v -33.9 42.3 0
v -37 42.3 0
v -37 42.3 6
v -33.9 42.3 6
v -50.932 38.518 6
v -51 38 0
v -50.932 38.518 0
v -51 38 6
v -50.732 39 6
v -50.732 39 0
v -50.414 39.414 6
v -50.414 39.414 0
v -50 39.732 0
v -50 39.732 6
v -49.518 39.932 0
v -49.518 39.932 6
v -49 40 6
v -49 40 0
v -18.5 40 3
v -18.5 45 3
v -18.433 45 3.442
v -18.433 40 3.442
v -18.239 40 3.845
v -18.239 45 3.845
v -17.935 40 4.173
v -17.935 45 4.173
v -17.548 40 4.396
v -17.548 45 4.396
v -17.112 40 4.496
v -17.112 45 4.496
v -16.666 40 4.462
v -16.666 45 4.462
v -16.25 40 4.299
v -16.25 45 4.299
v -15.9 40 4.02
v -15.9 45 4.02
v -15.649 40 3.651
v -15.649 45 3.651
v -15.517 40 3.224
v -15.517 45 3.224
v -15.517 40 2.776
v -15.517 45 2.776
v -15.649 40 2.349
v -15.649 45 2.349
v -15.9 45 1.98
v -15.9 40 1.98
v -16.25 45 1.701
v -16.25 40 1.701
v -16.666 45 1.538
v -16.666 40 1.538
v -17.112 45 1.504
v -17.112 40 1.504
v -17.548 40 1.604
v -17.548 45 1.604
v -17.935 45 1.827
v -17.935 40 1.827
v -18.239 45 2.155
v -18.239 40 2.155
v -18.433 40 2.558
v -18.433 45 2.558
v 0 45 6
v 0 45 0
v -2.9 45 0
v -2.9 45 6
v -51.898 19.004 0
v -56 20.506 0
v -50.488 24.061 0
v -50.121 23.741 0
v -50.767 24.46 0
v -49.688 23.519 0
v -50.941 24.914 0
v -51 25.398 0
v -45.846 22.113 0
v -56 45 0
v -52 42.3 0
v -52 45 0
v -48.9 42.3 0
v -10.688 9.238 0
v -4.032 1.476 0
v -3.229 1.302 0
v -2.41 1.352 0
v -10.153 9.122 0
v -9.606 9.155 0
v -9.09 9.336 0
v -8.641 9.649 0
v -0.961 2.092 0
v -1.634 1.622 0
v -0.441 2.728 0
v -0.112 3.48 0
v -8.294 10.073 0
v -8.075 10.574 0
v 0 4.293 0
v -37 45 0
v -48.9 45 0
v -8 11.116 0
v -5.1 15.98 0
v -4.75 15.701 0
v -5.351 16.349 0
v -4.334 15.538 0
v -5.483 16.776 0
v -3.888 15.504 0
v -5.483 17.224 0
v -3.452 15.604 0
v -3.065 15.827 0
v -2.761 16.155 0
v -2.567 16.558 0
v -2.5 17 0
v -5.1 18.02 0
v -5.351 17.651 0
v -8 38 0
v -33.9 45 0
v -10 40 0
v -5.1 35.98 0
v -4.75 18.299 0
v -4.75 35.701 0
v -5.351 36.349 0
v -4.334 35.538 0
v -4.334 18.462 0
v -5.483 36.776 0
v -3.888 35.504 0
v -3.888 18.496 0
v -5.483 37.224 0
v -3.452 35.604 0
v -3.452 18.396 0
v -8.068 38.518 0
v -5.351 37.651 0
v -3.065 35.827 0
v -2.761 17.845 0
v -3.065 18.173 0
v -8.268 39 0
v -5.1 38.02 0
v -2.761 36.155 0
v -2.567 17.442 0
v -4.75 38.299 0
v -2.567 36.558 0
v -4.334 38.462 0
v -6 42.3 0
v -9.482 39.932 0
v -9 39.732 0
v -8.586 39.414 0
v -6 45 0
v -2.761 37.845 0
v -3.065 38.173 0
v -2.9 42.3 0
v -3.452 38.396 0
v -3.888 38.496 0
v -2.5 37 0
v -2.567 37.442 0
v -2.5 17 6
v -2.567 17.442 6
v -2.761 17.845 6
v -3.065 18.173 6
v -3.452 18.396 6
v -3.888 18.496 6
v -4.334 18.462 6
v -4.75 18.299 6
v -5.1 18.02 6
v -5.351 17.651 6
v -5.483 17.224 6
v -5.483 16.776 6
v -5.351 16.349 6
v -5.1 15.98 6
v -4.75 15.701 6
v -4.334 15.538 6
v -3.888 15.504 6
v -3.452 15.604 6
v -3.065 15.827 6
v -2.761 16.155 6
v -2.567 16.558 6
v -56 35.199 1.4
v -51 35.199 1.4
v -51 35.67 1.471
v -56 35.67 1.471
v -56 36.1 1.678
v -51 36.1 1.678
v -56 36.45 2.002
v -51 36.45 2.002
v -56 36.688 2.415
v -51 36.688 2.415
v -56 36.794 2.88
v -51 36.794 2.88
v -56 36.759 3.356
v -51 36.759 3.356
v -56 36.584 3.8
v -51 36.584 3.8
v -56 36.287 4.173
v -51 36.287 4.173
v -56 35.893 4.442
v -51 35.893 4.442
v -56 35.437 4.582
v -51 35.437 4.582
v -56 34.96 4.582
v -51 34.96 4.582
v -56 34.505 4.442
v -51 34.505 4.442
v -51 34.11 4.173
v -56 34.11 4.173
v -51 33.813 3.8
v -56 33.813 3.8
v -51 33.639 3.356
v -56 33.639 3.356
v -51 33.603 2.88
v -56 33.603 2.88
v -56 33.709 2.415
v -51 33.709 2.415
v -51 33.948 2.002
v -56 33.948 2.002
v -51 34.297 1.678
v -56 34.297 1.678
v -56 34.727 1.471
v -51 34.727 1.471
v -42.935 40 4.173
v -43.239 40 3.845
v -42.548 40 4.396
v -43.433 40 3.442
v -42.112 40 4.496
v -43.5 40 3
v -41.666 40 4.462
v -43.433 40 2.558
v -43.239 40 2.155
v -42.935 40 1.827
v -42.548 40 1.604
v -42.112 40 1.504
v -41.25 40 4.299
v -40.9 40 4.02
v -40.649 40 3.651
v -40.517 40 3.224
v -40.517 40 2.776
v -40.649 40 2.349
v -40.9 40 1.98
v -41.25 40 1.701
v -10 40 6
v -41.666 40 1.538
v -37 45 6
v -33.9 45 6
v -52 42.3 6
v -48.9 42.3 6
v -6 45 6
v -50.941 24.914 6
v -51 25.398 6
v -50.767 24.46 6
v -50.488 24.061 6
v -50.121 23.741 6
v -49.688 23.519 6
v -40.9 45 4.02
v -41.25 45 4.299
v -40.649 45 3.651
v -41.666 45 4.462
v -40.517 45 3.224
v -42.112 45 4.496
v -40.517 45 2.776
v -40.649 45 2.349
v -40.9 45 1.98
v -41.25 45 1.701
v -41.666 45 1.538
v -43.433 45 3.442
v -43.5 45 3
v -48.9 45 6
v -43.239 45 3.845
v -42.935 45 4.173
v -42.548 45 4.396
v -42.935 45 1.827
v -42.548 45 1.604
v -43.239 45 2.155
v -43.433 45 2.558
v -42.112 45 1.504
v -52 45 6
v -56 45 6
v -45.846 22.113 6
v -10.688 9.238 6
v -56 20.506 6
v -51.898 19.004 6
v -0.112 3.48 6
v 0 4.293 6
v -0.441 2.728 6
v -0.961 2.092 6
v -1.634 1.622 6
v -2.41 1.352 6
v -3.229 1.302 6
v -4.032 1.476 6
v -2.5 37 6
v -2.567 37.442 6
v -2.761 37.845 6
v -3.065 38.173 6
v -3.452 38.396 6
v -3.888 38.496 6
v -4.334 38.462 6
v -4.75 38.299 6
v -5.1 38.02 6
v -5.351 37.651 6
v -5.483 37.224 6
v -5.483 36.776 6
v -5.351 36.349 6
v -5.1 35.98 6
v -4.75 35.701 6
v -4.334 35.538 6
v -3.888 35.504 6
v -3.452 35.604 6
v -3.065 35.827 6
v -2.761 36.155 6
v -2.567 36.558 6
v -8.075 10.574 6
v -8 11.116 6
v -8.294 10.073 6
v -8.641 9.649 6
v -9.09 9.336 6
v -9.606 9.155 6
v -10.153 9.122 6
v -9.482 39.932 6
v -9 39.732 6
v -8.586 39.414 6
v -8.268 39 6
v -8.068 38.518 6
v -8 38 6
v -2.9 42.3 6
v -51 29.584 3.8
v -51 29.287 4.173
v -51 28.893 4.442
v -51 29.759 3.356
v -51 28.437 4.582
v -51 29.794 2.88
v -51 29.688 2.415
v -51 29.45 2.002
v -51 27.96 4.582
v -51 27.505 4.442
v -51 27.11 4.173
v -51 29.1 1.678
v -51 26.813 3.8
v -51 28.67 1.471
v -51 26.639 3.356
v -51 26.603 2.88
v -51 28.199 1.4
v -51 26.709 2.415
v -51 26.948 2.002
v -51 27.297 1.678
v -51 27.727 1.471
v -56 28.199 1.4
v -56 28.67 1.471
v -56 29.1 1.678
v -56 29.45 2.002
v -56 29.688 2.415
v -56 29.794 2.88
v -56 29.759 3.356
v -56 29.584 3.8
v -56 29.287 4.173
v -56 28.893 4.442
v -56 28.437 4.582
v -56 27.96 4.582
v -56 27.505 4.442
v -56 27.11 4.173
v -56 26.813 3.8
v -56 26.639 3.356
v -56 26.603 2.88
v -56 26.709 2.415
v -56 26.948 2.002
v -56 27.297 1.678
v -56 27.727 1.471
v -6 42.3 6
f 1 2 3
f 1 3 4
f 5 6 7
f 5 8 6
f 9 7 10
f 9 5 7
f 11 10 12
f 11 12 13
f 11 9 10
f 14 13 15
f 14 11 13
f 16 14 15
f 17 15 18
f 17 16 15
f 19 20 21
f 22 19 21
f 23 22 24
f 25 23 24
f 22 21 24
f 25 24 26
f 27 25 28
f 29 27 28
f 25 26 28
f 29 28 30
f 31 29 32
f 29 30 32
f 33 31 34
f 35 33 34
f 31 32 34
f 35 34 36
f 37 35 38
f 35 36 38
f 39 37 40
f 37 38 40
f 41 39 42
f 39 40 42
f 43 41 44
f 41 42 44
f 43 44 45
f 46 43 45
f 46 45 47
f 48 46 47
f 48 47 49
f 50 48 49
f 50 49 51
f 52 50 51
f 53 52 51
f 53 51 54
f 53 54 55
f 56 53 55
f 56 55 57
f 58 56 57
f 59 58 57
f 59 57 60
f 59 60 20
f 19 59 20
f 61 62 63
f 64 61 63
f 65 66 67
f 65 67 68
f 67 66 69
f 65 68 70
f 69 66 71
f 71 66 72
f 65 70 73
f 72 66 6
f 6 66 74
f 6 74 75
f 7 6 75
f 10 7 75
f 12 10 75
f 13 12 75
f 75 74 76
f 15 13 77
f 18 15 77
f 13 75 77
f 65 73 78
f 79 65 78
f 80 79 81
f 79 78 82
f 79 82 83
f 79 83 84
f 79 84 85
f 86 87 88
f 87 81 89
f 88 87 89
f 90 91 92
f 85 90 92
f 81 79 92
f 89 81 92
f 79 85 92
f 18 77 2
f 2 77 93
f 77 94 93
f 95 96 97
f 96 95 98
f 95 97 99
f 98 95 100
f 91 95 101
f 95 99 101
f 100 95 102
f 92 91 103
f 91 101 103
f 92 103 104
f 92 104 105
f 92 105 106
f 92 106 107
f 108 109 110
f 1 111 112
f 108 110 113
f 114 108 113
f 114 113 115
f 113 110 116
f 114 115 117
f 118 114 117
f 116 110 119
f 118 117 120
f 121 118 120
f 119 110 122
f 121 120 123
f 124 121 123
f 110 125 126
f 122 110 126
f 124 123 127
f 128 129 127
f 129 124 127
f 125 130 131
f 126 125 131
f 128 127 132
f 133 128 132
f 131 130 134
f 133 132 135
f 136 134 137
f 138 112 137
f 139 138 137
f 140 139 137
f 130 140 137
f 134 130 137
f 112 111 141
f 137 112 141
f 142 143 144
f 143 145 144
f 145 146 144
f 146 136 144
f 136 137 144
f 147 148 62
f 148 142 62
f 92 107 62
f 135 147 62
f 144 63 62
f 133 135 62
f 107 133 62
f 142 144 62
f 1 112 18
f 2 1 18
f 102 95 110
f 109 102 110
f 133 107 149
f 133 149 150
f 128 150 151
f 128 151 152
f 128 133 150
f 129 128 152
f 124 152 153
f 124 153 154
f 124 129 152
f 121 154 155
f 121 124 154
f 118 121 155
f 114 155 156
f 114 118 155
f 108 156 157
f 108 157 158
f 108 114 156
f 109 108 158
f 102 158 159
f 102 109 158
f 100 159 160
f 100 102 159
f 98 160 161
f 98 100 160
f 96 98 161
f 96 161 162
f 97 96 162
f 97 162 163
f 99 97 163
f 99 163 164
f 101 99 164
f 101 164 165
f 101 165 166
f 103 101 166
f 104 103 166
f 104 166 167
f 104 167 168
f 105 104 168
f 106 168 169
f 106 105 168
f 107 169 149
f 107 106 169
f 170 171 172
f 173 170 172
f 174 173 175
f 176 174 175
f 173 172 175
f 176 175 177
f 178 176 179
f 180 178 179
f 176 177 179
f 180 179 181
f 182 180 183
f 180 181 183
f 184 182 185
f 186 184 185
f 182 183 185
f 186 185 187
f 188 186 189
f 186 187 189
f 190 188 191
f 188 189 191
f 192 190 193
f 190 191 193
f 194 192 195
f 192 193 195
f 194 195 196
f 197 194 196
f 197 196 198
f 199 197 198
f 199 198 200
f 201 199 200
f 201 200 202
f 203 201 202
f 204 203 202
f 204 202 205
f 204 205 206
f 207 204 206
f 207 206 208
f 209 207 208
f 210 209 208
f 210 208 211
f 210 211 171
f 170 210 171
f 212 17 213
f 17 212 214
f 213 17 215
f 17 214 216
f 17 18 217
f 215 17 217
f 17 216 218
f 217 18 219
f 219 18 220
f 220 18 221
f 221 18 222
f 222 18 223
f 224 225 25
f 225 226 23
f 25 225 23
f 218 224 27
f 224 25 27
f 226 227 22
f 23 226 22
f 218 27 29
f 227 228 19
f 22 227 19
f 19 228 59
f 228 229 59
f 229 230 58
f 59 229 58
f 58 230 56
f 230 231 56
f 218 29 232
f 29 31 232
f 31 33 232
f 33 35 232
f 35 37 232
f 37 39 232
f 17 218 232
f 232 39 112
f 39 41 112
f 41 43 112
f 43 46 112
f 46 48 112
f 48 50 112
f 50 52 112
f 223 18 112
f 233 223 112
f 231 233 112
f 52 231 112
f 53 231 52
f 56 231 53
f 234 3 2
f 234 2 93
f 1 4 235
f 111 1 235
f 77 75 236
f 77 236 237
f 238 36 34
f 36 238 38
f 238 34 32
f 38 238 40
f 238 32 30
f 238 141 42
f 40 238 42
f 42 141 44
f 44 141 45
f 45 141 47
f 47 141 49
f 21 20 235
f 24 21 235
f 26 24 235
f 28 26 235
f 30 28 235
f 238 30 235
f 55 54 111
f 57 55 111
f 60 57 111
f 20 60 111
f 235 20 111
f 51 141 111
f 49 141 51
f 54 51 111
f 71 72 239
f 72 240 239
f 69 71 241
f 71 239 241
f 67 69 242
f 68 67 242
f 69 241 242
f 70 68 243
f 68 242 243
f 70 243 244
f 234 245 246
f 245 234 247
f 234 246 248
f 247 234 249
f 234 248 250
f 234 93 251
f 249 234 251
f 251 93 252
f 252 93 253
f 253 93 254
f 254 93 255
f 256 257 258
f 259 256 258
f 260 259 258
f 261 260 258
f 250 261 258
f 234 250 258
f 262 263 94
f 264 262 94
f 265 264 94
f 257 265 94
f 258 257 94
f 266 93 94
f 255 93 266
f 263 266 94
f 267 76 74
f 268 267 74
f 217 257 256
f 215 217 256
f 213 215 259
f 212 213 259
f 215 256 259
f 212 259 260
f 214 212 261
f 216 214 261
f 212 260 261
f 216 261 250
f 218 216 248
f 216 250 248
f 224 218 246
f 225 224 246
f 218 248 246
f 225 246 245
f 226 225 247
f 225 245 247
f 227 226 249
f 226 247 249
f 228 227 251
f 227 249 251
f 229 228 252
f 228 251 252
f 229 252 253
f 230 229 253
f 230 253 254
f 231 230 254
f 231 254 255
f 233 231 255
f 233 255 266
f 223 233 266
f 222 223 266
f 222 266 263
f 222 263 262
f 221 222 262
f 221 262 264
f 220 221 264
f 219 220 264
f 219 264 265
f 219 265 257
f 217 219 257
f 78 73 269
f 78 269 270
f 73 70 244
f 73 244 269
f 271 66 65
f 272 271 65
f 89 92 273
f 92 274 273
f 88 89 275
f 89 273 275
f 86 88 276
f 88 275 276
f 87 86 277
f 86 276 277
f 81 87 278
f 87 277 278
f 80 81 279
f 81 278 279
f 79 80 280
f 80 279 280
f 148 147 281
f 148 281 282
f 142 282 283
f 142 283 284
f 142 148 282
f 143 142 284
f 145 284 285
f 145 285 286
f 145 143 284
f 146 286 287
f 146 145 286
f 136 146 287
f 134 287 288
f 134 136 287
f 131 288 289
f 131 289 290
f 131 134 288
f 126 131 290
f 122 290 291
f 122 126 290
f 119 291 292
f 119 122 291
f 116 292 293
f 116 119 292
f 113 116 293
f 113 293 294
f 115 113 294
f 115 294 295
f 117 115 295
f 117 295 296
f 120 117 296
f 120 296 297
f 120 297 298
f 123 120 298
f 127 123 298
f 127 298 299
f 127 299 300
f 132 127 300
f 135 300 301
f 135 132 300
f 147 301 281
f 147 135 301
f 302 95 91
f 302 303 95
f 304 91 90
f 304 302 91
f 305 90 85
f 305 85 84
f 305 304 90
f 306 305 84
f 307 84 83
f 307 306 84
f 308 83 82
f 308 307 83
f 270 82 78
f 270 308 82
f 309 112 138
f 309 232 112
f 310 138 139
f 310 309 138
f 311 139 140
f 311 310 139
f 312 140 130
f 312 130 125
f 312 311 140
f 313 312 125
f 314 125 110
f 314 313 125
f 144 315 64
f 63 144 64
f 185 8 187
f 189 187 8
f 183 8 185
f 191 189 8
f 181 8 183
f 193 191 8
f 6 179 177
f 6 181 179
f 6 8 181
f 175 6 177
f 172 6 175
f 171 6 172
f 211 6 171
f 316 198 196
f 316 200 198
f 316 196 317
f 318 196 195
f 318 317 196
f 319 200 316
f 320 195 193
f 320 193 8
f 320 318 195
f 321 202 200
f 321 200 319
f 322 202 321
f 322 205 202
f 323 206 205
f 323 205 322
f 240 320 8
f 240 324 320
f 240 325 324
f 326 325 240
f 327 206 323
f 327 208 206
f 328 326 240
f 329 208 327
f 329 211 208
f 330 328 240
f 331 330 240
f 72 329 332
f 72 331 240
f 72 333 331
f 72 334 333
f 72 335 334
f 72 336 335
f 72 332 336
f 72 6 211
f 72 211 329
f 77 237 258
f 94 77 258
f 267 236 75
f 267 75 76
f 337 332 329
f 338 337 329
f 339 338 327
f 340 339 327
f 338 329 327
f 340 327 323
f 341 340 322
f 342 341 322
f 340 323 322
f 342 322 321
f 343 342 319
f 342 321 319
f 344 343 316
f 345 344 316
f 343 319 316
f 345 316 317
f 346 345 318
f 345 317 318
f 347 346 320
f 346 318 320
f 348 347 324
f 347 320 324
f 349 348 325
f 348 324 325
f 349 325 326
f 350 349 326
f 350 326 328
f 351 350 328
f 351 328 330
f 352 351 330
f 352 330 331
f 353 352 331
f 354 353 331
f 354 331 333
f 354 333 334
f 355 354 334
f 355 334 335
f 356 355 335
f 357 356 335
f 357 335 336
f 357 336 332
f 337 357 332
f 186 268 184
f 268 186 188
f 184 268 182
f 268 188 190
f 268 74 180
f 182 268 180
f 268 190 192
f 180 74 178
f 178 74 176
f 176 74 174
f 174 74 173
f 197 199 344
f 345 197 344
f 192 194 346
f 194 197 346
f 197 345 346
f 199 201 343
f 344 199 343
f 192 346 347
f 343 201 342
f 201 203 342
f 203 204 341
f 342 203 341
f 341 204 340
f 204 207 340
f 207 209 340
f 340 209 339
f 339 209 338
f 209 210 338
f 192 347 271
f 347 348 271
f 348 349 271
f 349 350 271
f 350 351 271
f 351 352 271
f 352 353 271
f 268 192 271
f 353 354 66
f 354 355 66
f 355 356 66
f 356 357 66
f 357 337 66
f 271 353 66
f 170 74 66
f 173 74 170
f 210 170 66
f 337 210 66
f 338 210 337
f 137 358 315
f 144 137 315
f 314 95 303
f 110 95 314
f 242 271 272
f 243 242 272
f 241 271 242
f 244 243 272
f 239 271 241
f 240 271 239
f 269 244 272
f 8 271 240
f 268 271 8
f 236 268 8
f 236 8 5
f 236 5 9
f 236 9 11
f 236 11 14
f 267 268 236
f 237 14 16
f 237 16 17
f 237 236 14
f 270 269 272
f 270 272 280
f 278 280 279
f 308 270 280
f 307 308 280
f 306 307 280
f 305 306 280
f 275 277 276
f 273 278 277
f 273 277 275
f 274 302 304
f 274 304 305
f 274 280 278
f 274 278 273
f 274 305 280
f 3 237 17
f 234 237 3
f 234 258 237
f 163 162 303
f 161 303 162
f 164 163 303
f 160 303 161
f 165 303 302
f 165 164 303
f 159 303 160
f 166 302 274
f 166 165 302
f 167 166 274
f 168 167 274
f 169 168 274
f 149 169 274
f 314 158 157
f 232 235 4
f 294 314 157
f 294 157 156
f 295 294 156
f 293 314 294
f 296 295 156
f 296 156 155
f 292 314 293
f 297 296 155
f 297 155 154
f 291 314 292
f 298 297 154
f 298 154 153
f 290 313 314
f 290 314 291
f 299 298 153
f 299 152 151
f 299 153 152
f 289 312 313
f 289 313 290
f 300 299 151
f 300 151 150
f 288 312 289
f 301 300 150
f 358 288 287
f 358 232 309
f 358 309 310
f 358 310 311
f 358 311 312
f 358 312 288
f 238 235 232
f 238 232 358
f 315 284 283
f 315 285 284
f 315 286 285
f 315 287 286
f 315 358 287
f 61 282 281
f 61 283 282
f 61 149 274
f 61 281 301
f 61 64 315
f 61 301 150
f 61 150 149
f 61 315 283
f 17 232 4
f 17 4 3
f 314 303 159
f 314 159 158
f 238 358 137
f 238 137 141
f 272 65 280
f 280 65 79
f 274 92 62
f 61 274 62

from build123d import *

# Parameters (mm, degrees)
SKETCH_1_R          = 1.5
EXTRUDE_1_DEPTH     = 6
FILLET_1_R          = 3
CUT_EXTRUDE_1_REACH = 73.29
SKETCH_2_R          = 1.5
SKETCH_3_W          = 3.1
SKETCH_3_H          = 2.7
CUT_EXTRUDE_2_DEPTH = 73.090221251
FILLET_2_R          = 2
SKETCH_4_R          = 1.6
CUT_EXTRUDE_3_DEPTH = 69.27884006


with BuildPart() as part:
    # 草图1 → 凸台-拉伸1 (new body)
    with BuildSketch(Plane.XY):
        Polygon((0, 0), (0, 45), (-56, 45), (-56, 42.266964597), (-56, 20.506230936), (-51.898147584, 19.004203562), align=None)
        with Locations((-4, 37)):
            Circle(SKETCH_1_R, mode=Mode.SUBTRACT)
        with Locations((-4, 17)):
            Circle(SKETCH_1_R, mode=Mode.SUBTRACT)
        Polygon((-51, 40), (-51, 24), (-45.845984401, 22.112688677), (-8, 8.254144103), (-8, 40), (-49, 40), align=None, mode=Mode.SUBTRACT)
    extrude(amount=EXTRUDE_1_DEPTH)

    # 圆角1
    fillet_1_edges = [part.edges().sort_by_distance(p)[0] for p in [
        (0, 0, 3),
    ]]
    fillet(fillet_1_edges, radius=FILLET_1_R)

    # 草图2 → 切除-拉伸1 (cut, up to next)
    with BuildSketch(Plane(origin=(0, 45, 0), x_dir=(1, 0, 0), z_dir=(0, 1, 0)), mode=Mode.PRIVATE) as cut_extrude_1_sk1:
        with Locations(Location((-17, -3, 0), (0, 0, 180))):
            Circle(SKETCH_2_R)
    cut_extrude_1_tool1 = extrude(cut_extrude_1_sk1.sketch, amount=-CUT_EXTRUDE_1_REACH, mode=Mode.PRIVATE) & part.part
    # 草图2 → 切除-拉伸1 (cut, up to next)
    with BuildSketch(Plane(origin=(0, 45, 0), x_dir=(1, 0, 0), z_dir=(0, 1, 0)), mode=Mode.PRIVATE) as cut_extrude_1_sk2:
        with Locations(Location((-42, -3, 0), (0, 0, 180))):
            Circle(SKETCH_2_R)
    cut_extrude_1_tool2 = extrude(cut_extrude_1_sk2.sketch, amount=-CUT_EXTRUDE_1_REACH, mode=Mode.PRIVATE) & part.part
    add(cut_extrude_1_tool1.solids().sort_by_distance((-17, 45, 3))[0], mode=Mode.SUBTRACT)
    add(cut_extrude_1_tool2.solids().sort_by_distance((-42, 45, 3))[0], mode=Mode.SUBTRACT)

    # 草图3 → 切除-拉伸2 (cut, through all)
    with BuildSketch(Plane.XY.offset(6)):
        with Locations((-50.45, 43.65)):
            Rectangle(SKETCH_3_W, SKETCH_3_H)
        with Locations((-35.45, 43.65)):
            Rectangle(SKETCH_3_W, SKETCH_3_H)
        with Locations((-4.45, 43.65)):
            Rectangle(SKETCH_3_W, SKETCH_3_H)
    extrude(amount=-CUT_EXTRUDE_2_DEPTH, mode=Mode.SUBTRACT)

    # 圆角2
    fillet_2_edges = [part.edges().sort_by_distance(p)[0] for p in [
        (-51, 40, 3),
        (-51, 24, 3),
        (-8, 8.254144103, 3),
        (-8, 40, 3),
    ]]
    fillet(fillet_2_edges, radius=FILLET_2_R)

    # 草图4 → 切除-拉伸3 (cut, through all)
    with BuildSketch(Plane(origin=(-51, 0, 0), x_dir=(0, 0, -1), z_dir=(1, 0, 0))):
        with Locations((-3, 35.198753813)):
            Circle(SKETCH_4_R)
        with Locations((-3, 28.198753813)):
            Circle(SKETCH_4_R)
    extrude(amount=-CUT_EXTRUDE_3_DEPTH, mode=Mode.SUBTRACT)


solid = part.part
